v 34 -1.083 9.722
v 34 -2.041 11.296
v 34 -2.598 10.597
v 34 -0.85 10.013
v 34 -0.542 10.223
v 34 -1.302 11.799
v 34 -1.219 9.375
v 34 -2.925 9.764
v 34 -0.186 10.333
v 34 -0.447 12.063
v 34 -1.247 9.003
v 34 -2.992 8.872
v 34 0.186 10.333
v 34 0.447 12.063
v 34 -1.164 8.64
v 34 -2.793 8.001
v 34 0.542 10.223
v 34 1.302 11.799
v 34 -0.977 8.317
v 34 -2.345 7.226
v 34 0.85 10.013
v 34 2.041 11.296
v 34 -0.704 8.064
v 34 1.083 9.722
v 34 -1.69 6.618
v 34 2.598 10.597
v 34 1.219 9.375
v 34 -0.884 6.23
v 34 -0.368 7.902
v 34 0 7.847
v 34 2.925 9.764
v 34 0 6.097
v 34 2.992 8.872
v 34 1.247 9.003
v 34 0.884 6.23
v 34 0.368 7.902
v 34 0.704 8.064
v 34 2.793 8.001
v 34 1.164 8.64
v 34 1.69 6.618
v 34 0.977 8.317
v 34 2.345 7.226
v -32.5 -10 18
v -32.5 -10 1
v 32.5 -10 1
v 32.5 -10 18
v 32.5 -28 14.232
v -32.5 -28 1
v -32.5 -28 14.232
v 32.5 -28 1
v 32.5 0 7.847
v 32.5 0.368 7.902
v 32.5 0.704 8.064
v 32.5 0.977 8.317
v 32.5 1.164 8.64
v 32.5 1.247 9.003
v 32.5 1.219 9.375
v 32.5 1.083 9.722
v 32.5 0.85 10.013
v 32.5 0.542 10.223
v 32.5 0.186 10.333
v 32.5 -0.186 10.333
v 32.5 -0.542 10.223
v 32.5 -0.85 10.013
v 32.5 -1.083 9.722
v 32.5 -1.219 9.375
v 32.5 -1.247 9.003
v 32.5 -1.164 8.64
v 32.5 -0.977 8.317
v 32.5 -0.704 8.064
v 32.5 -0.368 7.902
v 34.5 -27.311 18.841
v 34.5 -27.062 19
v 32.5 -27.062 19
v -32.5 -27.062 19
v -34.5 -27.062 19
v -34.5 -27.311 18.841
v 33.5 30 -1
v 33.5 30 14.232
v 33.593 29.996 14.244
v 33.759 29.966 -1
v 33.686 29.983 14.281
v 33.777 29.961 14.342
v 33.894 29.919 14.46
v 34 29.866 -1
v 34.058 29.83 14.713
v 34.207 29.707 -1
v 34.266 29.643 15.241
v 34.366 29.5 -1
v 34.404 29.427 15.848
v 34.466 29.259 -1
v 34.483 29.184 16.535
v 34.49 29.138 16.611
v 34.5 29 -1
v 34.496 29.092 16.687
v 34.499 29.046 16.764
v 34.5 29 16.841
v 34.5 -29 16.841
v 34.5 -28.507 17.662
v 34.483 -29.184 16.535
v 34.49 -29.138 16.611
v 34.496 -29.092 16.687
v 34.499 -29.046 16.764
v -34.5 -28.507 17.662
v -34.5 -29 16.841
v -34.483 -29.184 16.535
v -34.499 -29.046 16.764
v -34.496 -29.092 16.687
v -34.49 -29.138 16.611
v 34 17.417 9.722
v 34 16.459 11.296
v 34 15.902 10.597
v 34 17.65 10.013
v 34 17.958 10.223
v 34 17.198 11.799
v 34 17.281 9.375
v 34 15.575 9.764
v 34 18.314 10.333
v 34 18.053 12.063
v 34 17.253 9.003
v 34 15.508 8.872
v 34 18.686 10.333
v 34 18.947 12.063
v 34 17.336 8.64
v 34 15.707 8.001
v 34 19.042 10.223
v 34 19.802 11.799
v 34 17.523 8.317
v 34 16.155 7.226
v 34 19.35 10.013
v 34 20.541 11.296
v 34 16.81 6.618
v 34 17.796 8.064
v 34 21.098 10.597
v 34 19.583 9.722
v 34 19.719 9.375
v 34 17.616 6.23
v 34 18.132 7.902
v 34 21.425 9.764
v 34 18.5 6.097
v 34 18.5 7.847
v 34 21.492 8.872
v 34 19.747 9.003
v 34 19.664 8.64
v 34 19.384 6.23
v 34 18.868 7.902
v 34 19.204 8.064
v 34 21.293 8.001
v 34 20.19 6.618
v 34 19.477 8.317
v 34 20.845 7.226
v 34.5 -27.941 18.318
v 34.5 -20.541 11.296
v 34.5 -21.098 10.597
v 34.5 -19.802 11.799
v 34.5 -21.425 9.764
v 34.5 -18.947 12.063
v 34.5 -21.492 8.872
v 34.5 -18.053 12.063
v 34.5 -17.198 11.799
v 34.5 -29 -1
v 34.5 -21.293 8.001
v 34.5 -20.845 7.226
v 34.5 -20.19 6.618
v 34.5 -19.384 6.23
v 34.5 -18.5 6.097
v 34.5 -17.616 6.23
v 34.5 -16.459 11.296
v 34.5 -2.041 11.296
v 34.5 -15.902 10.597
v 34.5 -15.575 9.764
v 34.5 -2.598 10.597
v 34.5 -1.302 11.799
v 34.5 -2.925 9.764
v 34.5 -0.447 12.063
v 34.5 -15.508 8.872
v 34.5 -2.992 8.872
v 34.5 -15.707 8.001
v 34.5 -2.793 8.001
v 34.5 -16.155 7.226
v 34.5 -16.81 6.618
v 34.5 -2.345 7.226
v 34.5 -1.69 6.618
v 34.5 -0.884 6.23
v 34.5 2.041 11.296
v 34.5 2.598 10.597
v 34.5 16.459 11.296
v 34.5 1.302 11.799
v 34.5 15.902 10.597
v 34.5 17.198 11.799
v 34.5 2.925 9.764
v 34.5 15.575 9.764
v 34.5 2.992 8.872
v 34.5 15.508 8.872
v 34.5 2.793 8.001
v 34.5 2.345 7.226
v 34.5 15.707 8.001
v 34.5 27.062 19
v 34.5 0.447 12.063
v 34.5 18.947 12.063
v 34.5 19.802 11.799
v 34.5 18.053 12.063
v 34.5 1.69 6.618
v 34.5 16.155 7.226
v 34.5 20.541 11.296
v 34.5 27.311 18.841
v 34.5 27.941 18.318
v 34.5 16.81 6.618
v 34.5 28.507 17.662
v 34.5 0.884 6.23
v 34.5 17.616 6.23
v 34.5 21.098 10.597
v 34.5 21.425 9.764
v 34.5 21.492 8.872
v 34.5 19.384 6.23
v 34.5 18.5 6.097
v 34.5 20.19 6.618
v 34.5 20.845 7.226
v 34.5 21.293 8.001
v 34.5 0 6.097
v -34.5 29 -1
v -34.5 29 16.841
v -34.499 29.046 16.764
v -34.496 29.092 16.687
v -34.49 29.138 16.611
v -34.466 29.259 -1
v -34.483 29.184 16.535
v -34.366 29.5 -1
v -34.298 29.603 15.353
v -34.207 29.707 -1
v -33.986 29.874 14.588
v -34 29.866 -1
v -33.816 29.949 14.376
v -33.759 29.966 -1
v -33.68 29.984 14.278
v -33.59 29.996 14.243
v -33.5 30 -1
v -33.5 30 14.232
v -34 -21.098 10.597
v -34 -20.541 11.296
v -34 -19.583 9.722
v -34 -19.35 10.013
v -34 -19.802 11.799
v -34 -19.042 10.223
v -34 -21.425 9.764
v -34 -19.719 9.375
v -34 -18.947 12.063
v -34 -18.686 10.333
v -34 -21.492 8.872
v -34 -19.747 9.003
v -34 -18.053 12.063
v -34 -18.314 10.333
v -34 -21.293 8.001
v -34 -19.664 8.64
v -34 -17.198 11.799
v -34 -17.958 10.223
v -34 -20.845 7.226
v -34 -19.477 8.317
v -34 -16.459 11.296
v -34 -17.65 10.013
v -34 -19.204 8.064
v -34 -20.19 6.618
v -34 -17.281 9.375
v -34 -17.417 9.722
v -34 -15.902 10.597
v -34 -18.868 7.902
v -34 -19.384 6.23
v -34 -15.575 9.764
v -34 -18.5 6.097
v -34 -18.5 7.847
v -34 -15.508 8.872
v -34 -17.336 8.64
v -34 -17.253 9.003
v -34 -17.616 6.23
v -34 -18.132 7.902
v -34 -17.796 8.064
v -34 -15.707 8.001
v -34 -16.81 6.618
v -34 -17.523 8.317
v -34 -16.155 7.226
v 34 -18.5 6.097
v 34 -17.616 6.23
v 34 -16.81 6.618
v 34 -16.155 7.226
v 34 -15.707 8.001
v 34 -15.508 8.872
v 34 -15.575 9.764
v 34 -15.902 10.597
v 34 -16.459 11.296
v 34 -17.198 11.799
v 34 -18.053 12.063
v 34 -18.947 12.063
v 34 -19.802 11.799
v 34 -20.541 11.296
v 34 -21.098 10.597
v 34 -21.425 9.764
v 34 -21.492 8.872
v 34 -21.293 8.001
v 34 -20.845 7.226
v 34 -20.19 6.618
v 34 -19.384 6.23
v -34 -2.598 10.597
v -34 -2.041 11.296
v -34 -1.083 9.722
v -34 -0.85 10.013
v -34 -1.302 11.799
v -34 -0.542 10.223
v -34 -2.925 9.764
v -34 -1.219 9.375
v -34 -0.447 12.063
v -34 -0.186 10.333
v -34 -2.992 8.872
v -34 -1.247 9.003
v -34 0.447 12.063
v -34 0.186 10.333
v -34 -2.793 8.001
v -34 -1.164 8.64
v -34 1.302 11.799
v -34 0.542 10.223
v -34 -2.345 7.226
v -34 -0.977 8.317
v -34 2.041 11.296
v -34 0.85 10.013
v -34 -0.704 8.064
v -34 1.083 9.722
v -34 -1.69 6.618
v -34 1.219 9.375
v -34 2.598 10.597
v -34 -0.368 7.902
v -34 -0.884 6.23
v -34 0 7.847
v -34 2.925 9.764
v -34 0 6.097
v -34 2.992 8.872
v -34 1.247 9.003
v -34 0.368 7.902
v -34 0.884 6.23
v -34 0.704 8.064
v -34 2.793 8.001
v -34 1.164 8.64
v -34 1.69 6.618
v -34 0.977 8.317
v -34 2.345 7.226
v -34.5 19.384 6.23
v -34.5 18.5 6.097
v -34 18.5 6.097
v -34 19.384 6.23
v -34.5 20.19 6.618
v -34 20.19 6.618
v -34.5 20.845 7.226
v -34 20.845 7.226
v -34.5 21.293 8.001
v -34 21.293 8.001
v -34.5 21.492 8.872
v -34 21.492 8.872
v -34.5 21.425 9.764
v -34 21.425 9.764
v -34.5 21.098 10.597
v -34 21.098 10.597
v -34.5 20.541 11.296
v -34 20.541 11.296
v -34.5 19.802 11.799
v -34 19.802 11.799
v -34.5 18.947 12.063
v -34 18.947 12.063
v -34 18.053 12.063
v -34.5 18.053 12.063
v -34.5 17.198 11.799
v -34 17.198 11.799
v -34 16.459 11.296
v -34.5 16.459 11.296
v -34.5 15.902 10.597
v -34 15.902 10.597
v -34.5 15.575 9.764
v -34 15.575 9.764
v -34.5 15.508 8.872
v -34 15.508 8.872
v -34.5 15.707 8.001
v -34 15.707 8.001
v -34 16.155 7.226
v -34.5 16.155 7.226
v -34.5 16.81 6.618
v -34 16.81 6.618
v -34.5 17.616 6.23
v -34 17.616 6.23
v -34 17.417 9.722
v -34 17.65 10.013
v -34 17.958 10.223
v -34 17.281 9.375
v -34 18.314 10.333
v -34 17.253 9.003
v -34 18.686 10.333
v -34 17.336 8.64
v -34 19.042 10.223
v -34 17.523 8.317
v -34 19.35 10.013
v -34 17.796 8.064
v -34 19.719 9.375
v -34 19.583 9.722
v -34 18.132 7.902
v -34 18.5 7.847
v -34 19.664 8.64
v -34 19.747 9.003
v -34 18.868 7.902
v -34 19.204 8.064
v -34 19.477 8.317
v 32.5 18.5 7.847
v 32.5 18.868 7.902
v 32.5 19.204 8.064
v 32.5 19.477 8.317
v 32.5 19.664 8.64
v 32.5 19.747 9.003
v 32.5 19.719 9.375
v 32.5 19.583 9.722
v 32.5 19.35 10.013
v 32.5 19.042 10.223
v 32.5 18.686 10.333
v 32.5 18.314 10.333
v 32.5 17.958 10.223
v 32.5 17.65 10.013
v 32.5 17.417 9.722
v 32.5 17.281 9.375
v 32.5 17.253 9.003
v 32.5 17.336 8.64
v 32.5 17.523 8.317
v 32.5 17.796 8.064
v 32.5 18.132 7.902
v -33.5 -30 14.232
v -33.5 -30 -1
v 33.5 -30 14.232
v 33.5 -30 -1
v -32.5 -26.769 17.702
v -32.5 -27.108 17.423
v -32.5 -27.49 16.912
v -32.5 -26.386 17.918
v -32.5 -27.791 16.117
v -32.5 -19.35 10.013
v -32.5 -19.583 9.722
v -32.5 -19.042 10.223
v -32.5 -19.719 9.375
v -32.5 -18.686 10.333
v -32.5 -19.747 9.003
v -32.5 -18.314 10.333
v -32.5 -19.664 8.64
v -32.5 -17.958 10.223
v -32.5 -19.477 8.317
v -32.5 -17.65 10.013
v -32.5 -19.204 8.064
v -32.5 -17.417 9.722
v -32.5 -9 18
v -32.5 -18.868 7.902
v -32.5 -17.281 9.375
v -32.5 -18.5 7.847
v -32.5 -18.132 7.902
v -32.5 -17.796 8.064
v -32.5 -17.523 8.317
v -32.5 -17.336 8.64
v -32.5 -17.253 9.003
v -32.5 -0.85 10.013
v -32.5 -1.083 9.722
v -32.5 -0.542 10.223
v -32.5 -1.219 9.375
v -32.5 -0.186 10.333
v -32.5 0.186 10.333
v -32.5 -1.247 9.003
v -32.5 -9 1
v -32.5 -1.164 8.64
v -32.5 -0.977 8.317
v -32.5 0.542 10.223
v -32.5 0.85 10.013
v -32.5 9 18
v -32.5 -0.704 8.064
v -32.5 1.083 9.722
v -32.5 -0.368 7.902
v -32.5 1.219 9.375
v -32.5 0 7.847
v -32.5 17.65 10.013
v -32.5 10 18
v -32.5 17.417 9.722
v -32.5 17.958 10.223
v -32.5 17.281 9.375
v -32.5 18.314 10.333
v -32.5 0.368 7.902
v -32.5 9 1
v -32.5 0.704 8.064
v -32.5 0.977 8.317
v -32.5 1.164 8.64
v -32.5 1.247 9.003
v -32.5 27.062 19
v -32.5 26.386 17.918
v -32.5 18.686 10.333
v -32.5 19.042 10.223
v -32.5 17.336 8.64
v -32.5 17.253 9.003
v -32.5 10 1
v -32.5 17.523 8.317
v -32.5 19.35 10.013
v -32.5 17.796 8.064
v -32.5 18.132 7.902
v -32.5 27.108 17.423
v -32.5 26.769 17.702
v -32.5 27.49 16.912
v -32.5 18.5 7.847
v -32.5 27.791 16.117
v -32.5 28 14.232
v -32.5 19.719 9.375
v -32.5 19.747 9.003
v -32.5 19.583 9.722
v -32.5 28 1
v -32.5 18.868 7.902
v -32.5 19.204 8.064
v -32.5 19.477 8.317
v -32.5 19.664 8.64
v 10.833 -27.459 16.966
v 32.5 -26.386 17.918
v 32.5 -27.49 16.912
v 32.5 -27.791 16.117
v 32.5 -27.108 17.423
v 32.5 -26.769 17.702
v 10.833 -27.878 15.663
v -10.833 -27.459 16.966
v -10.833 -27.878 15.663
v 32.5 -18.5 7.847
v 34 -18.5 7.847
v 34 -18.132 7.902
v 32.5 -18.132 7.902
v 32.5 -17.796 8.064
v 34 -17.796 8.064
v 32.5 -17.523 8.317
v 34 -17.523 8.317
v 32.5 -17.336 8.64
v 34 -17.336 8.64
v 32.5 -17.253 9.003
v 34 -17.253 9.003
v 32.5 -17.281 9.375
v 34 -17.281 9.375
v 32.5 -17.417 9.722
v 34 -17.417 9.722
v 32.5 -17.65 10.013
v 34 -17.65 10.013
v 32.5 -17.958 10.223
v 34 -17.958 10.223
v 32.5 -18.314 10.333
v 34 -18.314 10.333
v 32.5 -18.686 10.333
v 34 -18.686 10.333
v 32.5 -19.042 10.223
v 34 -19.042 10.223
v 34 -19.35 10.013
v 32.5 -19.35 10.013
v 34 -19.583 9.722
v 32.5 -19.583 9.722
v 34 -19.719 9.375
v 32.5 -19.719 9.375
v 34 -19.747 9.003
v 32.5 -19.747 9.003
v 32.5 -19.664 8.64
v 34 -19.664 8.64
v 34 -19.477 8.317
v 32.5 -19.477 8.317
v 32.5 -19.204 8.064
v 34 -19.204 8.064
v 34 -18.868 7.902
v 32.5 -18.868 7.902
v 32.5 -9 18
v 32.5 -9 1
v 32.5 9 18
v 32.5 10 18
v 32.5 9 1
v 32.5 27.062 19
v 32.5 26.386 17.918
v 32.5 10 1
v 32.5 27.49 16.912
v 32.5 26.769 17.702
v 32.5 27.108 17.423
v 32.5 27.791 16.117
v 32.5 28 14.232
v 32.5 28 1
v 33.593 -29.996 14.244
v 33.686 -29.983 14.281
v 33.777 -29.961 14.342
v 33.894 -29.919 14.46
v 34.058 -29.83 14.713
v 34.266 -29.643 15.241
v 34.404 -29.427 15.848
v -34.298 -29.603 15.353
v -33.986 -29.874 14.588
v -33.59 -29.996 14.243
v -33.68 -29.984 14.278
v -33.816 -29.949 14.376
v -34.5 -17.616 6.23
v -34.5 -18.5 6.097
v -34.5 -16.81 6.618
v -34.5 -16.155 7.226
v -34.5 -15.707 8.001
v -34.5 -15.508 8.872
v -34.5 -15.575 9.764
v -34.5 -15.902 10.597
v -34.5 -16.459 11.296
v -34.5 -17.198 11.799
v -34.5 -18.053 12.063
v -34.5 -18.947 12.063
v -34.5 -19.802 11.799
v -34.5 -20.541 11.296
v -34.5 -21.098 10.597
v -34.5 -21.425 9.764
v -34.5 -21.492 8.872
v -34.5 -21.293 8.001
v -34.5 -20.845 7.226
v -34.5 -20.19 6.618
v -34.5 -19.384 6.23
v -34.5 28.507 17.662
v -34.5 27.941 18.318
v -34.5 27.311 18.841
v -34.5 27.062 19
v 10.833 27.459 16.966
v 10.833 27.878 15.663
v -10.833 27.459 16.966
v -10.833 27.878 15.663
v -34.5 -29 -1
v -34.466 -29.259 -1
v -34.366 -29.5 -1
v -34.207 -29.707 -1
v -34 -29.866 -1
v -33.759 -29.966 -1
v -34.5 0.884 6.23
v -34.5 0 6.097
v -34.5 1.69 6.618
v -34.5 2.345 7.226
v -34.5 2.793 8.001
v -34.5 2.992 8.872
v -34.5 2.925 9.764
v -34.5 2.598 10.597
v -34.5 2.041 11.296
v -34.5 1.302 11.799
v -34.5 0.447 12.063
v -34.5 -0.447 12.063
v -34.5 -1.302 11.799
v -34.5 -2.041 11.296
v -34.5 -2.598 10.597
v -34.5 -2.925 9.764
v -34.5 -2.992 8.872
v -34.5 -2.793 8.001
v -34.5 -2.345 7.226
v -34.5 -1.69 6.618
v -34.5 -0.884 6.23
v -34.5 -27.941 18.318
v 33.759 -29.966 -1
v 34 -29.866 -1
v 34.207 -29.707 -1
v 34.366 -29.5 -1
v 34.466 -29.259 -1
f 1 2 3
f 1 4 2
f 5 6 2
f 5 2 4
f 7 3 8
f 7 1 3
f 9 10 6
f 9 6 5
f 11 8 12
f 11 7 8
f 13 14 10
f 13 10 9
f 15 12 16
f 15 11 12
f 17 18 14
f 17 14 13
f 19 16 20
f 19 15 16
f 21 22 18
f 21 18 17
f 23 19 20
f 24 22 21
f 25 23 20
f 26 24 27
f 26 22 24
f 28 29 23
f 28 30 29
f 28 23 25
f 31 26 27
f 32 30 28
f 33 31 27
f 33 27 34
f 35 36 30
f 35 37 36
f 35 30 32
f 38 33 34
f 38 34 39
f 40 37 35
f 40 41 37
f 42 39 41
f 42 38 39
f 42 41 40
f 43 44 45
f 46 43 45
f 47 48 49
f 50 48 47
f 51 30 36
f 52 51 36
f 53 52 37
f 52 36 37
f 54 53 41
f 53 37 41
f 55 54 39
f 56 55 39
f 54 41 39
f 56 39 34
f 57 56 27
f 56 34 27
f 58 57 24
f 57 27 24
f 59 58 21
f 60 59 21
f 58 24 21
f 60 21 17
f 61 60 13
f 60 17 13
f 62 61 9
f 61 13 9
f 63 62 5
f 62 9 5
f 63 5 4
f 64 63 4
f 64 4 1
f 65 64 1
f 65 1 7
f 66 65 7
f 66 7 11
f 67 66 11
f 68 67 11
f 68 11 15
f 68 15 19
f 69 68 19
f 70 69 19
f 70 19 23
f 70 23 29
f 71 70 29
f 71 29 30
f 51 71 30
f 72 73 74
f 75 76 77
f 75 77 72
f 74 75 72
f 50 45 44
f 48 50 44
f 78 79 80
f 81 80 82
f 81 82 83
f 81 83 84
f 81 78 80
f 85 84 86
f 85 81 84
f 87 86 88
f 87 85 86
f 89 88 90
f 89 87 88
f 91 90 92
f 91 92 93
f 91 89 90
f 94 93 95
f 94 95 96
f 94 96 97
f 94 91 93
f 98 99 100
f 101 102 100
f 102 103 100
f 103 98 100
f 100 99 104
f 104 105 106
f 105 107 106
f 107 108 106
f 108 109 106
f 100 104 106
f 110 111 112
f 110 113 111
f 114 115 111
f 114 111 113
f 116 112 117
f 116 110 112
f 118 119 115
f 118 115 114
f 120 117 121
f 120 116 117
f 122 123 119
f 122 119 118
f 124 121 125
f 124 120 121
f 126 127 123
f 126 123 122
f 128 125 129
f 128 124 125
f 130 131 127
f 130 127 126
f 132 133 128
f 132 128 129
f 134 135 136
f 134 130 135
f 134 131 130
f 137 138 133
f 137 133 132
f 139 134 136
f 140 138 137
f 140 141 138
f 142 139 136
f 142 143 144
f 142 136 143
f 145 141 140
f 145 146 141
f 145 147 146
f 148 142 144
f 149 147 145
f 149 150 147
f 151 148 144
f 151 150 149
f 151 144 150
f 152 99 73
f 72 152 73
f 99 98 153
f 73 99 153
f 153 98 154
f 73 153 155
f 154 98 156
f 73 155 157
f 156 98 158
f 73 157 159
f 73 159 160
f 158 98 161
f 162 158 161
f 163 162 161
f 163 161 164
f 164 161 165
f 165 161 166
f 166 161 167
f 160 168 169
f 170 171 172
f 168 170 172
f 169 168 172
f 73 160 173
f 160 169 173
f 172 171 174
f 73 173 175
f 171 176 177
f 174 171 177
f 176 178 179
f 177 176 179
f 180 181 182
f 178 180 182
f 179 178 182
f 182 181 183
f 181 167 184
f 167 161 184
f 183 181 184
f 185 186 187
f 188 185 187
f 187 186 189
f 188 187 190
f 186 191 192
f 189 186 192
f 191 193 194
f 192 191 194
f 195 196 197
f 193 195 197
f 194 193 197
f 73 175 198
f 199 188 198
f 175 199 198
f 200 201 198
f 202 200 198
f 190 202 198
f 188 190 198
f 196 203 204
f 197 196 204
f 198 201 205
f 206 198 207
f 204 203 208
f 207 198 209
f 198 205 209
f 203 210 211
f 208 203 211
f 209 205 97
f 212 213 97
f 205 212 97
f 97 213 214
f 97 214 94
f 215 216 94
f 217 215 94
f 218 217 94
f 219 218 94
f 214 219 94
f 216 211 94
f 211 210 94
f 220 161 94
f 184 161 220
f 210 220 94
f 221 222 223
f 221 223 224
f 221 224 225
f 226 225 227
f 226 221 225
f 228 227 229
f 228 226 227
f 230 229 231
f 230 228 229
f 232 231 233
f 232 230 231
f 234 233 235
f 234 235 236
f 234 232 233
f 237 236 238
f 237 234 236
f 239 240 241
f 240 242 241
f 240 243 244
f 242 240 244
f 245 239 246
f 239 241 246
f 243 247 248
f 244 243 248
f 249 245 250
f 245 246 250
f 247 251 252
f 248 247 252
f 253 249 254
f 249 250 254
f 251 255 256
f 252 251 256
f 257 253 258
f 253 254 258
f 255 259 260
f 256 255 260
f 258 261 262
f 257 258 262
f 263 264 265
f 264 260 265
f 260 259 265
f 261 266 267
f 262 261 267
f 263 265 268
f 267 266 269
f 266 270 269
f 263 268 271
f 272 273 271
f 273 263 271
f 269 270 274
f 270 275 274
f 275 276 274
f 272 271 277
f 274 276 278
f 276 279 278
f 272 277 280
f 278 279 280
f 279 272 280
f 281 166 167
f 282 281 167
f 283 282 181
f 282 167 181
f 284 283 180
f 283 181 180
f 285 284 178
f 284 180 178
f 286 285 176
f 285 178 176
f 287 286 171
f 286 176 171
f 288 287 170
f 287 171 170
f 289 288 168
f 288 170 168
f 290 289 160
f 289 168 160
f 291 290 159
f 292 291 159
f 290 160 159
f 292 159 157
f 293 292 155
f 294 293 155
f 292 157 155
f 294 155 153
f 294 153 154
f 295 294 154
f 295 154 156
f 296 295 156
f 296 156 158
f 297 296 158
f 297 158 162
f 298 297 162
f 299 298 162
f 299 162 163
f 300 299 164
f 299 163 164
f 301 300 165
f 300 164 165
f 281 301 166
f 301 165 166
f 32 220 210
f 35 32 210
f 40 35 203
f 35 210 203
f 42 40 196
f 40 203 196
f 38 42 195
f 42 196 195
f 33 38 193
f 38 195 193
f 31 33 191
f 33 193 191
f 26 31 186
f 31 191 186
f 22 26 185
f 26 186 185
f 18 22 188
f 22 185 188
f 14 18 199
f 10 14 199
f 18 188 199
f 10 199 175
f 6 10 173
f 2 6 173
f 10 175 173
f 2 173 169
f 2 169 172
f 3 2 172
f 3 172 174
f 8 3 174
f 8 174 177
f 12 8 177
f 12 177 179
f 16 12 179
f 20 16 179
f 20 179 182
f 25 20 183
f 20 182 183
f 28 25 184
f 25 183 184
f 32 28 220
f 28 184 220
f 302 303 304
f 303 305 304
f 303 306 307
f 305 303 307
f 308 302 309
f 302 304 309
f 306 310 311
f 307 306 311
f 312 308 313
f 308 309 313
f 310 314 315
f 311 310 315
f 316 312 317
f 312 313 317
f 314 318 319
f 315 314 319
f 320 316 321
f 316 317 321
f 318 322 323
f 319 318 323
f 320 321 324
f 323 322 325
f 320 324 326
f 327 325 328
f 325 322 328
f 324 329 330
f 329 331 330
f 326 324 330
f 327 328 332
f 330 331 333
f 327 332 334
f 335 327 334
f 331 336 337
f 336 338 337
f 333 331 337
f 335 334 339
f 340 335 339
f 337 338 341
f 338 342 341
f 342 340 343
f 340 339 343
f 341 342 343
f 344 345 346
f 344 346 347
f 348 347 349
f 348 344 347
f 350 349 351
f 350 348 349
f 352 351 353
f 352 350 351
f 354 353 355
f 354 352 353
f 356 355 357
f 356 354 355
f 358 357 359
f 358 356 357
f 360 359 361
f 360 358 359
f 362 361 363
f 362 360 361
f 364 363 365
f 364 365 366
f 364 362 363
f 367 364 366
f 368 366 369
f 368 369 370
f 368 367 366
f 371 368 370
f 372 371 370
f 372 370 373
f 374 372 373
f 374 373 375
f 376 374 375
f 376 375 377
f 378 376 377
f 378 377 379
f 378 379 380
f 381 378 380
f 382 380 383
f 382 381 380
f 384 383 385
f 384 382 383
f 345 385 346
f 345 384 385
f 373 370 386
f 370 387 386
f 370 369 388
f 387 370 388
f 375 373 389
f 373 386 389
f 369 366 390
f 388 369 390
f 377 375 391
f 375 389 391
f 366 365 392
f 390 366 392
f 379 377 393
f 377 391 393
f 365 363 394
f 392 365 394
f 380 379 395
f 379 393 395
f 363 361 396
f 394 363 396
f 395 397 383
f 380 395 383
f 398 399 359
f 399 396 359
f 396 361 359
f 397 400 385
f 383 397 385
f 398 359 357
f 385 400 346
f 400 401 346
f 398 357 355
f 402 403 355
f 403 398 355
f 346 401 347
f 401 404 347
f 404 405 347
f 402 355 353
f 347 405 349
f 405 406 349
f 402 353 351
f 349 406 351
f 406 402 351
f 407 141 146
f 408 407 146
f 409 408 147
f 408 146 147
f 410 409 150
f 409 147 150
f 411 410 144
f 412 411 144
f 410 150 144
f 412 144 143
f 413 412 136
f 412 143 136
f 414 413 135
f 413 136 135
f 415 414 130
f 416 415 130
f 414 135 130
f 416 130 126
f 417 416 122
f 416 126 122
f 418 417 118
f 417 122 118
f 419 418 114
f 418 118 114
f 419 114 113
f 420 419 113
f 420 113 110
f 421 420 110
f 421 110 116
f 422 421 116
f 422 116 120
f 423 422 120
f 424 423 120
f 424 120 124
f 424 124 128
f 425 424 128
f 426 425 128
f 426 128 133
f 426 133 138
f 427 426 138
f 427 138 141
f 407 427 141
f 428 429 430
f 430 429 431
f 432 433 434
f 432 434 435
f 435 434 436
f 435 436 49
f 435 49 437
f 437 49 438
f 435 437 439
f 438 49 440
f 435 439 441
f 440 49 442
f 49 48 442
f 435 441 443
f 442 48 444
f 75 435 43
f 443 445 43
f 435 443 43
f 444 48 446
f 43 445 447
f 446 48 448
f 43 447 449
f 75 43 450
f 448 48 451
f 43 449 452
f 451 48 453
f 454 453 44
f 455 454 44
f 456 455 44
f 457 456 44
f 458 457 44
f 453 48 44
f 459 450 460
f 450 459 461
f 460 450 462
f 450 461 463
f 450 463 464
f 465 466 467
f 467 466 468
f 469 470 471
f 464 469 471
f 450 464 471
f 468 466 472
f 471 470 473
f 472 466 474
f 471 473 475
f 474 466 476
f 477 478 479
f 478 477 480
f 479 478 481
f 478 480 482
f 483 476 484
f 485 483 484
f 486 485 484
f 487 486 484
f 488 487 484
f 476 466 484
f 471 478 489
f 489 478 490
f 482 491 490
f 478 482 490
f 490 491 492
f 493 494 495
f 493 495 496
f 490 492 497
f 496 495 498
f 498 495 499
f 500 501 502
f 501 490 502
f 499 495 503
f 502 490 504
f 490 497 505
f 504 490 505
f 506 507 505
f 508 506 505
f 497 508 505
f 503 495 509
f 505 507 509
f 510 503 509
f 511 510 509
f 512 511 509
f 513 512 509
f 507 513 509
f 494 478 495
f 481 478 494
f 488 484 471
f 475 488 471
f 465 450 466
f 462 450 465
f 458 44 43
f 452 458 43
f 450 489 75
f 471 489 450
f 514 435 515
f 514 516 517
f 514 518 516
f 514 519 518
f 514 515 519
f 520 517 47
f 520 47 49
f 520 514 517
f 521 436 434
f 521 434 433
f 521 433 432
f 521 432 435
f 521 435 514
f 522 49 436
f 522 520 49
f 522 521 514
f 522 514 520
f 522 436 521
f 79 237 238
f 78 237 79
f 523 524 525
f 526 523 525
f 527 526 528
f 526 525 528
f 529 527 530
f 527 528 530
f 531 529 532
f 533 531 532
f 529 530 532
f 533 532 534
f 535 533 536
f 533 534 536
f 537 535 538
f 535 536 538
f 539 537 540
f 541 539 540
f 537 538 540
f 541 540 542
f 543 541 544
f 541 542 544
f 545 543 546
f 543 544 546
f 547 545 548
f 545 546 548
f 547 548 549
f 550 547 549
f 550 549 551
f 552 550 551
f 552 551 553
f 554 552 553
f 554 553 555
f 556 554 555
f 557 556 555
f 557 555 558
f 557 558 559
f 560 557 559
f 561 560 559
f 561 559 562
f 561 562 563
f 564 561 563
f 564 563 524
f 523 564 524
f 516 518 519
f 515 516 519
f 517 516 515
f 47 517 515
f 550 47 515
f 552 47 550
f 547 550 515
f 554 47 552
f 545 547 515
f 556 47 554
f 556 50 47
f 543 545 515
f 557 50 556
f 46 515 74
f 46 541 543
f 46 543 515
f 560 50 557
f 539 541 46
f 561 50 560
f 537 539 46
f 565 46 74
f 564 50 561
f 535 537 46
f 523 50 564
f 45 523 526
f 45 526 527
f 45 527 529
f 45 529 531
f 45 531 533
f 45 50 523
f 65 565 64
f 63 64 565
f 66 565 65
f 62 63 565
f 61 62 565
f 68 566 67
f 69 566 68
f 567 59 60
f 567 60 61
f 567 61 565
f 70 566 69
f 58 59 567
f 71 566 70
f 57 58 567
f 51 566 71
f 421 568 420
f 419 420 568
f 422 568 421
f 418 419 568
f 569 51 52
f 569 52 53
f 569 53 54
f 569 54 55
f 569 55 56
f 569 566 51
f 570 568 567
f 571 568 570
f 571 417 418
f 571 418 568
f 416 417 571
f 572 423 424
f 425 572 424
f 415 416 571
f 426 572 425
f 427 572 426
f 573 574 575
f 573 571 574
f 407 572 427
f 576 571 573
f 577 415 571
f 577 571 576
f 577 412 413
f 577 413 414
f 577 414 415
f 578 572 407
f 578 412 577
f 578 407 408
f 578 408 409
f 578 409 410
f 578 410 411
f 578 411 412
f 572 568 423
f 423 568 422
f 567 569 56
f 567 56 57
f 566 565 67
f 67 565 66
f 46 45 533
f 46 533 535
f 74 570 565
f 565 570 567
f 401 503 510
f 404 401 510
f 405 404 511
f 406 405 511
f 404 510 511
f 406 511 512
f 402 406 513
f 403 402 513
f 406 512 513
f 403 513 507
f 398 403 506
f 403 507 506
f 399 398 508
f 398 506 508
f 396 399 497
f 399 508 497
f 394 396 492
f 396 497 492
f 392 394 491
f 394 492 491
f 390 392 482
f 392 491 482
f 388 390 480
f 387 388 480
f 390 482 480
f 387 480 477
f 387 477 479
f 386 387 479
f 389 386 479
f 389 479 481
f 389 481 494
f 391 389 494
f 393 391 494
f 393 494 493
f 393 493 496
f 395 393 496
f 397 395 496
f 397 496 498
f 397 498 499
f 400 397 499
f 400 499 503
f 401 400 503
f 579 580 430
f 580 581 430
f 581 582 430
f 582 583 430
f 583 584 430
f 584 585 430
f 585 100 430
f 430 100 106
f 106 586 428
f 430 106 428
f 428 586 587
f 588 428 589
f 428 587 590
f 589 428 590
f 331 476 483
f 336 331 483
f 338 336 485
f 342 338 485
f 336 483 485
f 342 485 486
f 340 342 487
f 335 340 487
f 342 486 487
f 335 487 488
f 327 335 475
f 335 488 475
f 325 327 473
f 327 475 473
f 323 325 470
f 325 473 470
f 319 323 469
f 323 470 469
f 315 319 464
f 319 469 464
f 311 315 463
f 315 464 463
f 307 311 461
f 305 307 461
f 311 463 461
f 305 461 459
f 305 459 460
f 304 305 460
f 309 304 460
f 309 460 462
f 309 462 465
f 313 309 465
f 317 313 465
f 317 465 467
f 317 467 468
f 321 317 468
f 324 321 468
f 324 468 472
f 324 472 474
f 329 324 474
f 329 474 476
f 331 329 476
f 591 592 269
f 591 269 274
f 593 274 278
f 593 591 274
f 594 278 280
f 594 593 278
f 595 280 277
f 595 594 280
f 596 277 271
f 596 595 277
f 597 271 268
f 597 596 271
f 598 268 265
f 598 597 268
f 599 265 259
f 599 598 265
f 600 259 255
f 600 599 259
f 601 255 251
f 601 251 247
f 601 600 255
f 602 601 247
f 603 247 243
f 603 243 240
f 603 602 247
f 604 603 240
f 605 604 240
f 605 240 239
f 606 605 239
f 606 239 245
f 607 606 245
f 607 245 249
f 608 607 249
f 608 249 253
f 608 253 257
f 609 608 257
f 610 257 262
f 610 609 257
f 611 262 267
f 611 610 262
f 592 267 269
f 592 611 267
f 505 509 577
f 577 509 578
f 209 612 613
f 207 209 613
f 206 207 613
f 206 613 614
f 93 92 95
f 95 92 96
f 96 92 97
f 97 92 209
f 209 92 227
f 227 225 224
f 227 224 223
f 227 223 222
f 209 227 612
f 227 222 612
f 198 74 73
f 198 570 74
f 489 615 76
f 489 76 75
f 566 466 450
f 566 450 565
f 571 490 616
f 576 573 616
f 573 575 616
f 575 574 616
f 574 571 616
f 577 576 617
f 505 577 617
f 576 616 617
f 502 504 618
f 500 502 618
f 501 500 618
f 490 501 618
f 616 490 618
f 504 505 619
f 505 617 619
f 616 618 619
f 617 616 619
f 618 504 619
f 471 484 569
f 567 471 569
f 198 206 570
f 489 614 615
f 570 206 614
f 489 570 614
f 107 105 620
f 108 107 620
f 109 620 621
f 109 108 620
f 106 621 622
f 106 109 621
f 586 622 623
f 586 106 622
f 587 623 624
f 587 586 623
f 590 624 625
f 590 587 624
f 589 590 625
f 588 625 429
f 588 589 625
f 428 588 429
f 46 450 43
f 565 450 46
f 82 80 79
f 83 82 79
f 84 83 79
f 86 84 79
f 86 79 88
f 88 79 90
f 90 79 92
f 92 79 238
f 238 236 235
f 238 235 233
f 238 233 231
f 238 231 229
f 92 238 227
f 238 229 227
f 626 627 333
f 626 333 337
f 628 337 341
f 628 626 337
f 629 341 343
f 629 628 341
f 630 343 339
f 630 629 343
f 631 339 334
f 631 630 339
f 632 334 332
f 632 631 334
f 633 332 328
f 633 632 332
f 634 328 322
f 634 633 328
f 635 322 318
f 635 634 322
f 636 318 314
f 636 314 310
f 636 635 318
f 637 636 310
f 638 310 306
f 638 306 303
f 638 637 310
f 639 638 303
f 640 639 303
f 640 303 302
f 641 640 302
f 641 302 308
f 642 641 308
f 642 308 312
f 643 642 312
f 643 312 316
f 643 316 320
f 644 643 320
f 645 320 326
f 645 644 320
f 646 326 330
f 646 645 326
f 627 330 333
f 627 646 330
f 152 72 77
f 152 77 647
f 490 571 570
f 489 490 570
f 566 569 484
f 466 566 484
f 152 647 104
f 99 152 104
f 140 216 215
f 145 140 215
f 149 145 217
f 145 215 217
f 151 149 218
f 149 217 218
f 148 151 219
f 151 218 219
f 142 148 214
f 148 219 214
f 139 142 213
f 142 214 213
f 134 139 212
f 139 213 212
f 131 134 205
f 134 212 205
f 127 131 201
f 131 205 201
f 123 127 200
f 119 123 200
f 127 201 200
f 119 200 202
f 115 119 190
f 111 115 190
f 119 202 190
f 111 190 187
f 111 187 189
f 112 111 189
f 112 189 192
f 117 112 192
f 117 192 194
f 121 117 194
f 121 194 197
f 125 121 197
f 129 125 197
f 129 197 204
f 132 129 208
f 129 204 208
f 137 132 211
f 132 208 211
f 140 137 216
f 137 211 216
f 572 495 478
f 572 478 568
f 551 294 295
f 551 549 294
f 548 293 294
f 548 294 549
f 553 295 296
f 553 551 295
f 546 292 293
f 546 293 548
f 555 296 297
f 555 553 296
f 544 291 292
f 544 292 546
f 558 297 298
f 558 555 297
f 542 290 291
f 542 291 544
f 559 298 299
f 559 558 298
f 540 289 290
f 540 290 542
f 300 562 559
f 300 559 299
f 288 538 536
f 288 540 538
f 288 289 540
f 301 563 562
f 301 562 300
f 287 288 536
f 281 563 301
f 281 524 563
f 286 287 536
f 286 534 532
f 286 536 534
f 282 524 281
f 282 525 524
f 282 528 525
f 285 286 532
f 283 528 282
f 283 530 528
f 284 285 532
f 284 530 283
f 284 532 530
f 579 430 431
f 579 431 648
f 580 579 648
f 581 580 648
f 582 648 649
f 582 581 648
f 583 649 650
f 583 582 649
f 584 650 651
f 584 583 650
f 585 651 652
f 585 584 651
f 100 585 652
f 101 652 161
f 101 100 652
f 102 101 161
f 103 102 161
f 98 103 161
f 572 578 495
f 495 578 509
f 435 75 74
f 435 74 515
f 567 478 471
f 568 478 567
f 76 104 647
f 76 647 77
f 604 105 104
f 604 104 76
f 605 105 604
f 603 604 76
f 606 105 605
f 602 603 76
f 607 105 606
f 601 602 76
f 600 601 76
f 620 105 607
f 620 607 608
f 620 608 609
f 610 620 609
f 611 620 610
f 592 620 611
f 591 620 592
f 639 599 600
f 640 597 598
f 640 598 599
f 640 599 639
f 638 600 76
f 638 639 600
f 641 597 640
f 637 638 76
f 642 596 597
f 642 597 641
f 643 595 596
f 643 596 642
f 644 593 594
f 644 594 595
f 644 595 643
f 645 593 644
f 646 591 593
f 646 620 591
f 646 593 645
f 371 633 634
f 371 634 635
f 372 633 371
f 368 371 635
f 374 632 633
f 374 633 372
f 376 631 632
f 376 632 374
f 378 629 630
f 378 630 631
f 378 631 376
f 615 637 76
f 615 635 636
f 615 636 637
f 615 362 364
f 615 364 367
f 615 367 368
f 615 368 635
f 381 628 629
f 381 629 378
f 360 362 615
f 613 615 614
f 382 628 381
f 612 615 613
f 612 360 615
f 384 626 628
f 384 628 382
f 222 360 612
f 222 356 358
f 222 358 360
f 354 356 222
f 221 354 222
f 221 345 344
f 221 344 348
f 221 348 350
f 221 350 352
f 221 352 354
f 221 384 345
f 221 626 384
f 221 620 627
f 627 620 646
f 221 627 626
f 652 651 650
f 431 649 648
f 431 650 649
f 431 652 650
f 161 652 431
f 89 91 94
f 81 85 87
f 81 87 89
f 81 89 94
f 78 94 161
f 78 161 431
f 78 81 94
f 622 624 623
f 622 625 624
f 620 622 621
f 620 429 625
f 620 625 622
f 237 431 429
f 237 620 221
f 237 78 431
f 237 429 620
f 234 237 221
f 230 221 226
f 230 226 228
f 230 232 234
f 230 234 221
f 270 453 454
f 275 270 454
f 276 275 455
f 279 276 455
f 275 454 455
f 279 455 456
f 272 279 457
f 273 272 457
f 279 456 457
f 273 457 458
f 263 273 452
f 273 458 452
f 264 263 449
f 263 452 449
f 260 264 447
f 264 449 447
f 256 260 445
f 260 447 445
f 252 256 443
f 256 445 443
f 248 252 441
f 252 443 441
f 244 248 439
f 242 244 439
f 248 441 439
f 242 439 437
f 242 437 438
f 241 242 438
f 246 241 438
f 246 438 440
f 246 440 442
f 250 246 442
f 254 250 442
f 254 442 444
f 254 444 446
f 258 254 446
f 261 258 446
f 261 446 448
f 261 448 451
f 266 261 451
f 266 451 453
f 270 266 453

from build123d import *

# Parameters (mm, degrees)
SKETCH2_W           = 69
SKETCH2_H           = 60
SKETCH2_W_2         = 65
SKETCH2_H_2         = 56
BOSS_EXTRUDE1_DEPTH = 19
SKETCH3_W           = 69
SKETCH3_H           = 60
BOSS_EXTRUDE2_DEPTH = 1
BOSS_EXTRUDE4_DEPTH = 67.5
CUT_EXTRUDE1_DEPTH  = 135
SKETCH7_W           = 84.404027411
SKETCH7_H           = 26.874448114
CUT_EXTRUDE2_DEPTH  = 135
SKETCH9_W           = 65
SKETCH9_H           = 1
BOSS_EXTRUDE5_DEPTH = 17
FILLET1_R           = 1
SKETCH10_R          = 3
CUT_EXTRUDE6_DEPTH  = 0.5
CUT_EXTRUDE7_REACH  = 79.602
SKETCH11_R          = 1.25


with BuildPart() as part:
    # Sketch2 → Boss-Extrude1 (new body)
    with BuildSketch(Plane.XY):
        Rectangle(SKETCH2_W, SKETCH2_H)
        Rectangle(SKETCH2_W_2, SKETCH2_H_2, mode=Mode.SUBTRACT)
    extrude(amount=BOSS_EXTRUDE1_DEPTH)

    # Sketch3 → Boss-Extrude2 (add, symmetric)
    with BuildSketch(Plane(origin=(0, 0, 0), x_dir=(-1, 0, 0), z_dir=(0, 0, -1))):
        Rectangle(SKETCH3_W, SKETCH3_H)
    extrude(amount=BOSS_EXTRUDE2_DEPTH, both=True)

    # Sketch4 → Boss-Extrude4 (add, symmetric)
    with BuildSketch(Plane.ZY.offset(34.5)):
        with BuildLine():
            Line((19, -27.062112177), (17.917720438, -26.385779399))
            add(Edge.make_bspline(
                [(17.917720438, -26.385779399), (17.068052287, -28.229247979), (14.940376438, -27.841186756), (13.351451557, -28.086320914)],
                knots=[0, 0, 0, 0, 1, 1, 1, 1], degree=3))
            Line((13.351451557, -28.086320914), (14.231772034, -30))
            add(Edge.make_bspline(
                [(14.231772034, -30), (17.788479479, -29.104156819), (19, -27.062112177)],
                knots=[0, 0, 0, 0.719469437, 0.719469437, 0.719469437], degree=2))
        make_face()
        with BuildLine():
            Line((14.231772034, 30), (13.351451557, 28.086320914))
            add(Edge.make_bspline(
                [(17.917720438, 26.385779399), (17.068052287, 28.229247979), (14.940376438, 27.841186756), (13.351451557, 28.086320914)],
                knots=[0, 0, 0, 0, 1, 1, 1, 1], degree=3))
            Line((17.917720438, 26.385779399), (19, 27.062112177))
            add(Edge.make_bspline(
                [(14.231772034, 30), (17.788479479, 29.104156819), (19, 27.062112177)],
                knots=[0, 0, 0, 0.719469437, 0.719469437, 0.719469437], degree=2))
        make_face()
    extrude(amount=BOSS_EXTRUDE4_DEPTH, both=True)

    # Sketch6 → Cut-Extrude1 (cut)
    with BuildSketch(Plane.ZY.offset(34.5)):
        Polygon((19, -30), (19, -27.062112177), (18.840520093, -27.311263152), (18.318412732, -27.941049653), (17.662350265, -28.50734155), (16.534506271, -29.184167719), (14.231772034, -30), align=None)
        Polygon((19, 30), (14.231772034, 30), (16.534506271, 29.184167719), (17.662350265, 28.50734155), (18.318412732, 27.941049653), (18.840520093, 27.311263152), (19, 27.062112177), align=None)
    extrude(amount=-CUT_EXTRUDE1_DEPTH, mode=Mode.SUBTRACT)

    # Sketch7 → Cut-Extrude2 (cut)
    with BuildSketch(Plane.XZ.offset(30)):
        with Locations((-76.702013706, 12.437224057)):
            Rectangle(SKETCH7_W, SKETCH7_H)
    extrude(amount=-CUT_EXTRUDE2_DEPTH, mode=Mode.SUBTRACT)

    # Sketch9 → Boss-Extrude5 (add)
    with BuildSketch(Plane.XY.offset(1)):
        with Locations((0, 9.5)):
            Rectangle(SKETCH9_W, SKETCH9_H)
        with Locations((0, -9.5)):
            Rectangle(SKETCH9_W, SKETCH9_H)
    extrude(amount=BOSS_EXTRUDE5_DEPTH)

    # Fillet1
    fillet1_edges = [part.edges().sort_by_distance(p)[0] for p in [
        (-34.5, 30, 6.615886017),
        (-34.5, -30, 6.615886017),
        (34.5, 30, 6.615886017),
        (34.5, -30, 6.615886017),
    ]]
    fillet(fillet1_edges, radius=FILLET1_R)

    # Sketch10 → Cut-Extrude6 (cut)
    with BuildSketch(Plane(origin=(34.5, 0, 0), x_dir=(0, 0, -1), z_dir=(1, 0, 0))):
        with Locations((-9.09656972, -18.5)):
            Circle(SKETCH10_R)
        with Locations((-9.09656972, 0)):
            Circle(SKETCH10_R)
        with Locations((-9.09656972, 18.5)):
            Circle(SKETCH10_R)
    cut_extrude6 = extrude(amount=-CUT_EXTRUDE6_DEPTH, mode=Mode.SUBTRACT)

    # Cut-Extrude7: up to this face of the body (flat: up to its plane)
    cut_extrude7_end = Plane(part.part.faces().sort_by_distance((-34.5, 0, 8.972249648))[0])
    # Sketch11 → Cut-Extrude7 (cut, up to the picked face)
    with BuildSketch(Plane(origin=(34.5, 0, 0), x_dir=(0, 0, -1), z_dir=(1, 0, 0)), mode=Mode.PRIVATE) as cut_extrude7_sk1:
        with Locations((-9.09656972, -18.5)):
            Circle(SKETCH11_R)
    cut_extrude7_tool1 = split(extrude(cut_extrude7_sk1.sketch, amount=-CUT_EXTRUDE7_REACH, mode=Mode.PRIVATE), bisect_by=cut_extrude7_end, keep=Keep.BOTH, mode=Mode.PRIVATE)
    # Sketch11 → Cut-Extrude7 (cut, up to the picked face)
    with BuildSketch(Plane(origin=(34.5, 0, 0), x_dir=(0, 0, -1), z_dir=(1, 0, 0)), mode=Mode.PRIVATE) as cut_extrude7_sk2:
        with Locations((-9.09656972, 0)):
            Circle(SKETCH11_R)
    cut_extrude7_tool2 = split(extrude(cut_extrude7_sk2.sketch, amount=-CUT_EXTRUDE7_REACH, mode=Mode.PRIVATE), bisect_by=cut_extrude7_end, keep=Keep.BOTH, mode=Mode.PRIVATE)
    # Sketch11 → Cut-Extrude7 (cut, up to the picked face)
    with BuildSketch(Plane(origin=(34.5, 0, 0), x_dir=(0, 0, -1), z_dir=(1, 0, 0)), mode=Mode.PRIVATE) as cut_extrude7_sk3:
        with Locations((-9.09656972, 18.5)):
            Circle(SKETCH11_R)
    cut_extrude7_tool3 = split(extrude(cut_extrude7_sk3.sketch, amount=-CUT_EXTRUDE7_REACH, mode=Mode.PRIVATE), bisect_by=cut_extrude7_end, keep=Keep.BOTH, mode=Mode.PRIVATE)
    add(cut_extrude7_tool1.solids().sort_by(Axis((34.5, -18.5, 9.09657), (-1, 0, 0)))[0], mode=Mode.SUBTRACT)
    add(cut_extrude7_tool2.solids().sort_by(Axis((34.5, 0, 9.09657), (-1, 0, 0)))[0], mode=Mode.SUBTRACT)
    add(cut_extrude7_tool3.solids().sort_by(Axis((34.5, 18.5, 9.09657), (-1, 0, 0)))[0], mode=Mode.SUBTRACT)

    # Mirror1: Cut-Extrude6 across plane
    add(cut_extrude6.mirror(Plane(origin=(0, 0, 0), x_dir=(0, 0, 1), z_dir=(1, 0, 0))), mode=Mode.SUBTRACT)


solid = part.part
